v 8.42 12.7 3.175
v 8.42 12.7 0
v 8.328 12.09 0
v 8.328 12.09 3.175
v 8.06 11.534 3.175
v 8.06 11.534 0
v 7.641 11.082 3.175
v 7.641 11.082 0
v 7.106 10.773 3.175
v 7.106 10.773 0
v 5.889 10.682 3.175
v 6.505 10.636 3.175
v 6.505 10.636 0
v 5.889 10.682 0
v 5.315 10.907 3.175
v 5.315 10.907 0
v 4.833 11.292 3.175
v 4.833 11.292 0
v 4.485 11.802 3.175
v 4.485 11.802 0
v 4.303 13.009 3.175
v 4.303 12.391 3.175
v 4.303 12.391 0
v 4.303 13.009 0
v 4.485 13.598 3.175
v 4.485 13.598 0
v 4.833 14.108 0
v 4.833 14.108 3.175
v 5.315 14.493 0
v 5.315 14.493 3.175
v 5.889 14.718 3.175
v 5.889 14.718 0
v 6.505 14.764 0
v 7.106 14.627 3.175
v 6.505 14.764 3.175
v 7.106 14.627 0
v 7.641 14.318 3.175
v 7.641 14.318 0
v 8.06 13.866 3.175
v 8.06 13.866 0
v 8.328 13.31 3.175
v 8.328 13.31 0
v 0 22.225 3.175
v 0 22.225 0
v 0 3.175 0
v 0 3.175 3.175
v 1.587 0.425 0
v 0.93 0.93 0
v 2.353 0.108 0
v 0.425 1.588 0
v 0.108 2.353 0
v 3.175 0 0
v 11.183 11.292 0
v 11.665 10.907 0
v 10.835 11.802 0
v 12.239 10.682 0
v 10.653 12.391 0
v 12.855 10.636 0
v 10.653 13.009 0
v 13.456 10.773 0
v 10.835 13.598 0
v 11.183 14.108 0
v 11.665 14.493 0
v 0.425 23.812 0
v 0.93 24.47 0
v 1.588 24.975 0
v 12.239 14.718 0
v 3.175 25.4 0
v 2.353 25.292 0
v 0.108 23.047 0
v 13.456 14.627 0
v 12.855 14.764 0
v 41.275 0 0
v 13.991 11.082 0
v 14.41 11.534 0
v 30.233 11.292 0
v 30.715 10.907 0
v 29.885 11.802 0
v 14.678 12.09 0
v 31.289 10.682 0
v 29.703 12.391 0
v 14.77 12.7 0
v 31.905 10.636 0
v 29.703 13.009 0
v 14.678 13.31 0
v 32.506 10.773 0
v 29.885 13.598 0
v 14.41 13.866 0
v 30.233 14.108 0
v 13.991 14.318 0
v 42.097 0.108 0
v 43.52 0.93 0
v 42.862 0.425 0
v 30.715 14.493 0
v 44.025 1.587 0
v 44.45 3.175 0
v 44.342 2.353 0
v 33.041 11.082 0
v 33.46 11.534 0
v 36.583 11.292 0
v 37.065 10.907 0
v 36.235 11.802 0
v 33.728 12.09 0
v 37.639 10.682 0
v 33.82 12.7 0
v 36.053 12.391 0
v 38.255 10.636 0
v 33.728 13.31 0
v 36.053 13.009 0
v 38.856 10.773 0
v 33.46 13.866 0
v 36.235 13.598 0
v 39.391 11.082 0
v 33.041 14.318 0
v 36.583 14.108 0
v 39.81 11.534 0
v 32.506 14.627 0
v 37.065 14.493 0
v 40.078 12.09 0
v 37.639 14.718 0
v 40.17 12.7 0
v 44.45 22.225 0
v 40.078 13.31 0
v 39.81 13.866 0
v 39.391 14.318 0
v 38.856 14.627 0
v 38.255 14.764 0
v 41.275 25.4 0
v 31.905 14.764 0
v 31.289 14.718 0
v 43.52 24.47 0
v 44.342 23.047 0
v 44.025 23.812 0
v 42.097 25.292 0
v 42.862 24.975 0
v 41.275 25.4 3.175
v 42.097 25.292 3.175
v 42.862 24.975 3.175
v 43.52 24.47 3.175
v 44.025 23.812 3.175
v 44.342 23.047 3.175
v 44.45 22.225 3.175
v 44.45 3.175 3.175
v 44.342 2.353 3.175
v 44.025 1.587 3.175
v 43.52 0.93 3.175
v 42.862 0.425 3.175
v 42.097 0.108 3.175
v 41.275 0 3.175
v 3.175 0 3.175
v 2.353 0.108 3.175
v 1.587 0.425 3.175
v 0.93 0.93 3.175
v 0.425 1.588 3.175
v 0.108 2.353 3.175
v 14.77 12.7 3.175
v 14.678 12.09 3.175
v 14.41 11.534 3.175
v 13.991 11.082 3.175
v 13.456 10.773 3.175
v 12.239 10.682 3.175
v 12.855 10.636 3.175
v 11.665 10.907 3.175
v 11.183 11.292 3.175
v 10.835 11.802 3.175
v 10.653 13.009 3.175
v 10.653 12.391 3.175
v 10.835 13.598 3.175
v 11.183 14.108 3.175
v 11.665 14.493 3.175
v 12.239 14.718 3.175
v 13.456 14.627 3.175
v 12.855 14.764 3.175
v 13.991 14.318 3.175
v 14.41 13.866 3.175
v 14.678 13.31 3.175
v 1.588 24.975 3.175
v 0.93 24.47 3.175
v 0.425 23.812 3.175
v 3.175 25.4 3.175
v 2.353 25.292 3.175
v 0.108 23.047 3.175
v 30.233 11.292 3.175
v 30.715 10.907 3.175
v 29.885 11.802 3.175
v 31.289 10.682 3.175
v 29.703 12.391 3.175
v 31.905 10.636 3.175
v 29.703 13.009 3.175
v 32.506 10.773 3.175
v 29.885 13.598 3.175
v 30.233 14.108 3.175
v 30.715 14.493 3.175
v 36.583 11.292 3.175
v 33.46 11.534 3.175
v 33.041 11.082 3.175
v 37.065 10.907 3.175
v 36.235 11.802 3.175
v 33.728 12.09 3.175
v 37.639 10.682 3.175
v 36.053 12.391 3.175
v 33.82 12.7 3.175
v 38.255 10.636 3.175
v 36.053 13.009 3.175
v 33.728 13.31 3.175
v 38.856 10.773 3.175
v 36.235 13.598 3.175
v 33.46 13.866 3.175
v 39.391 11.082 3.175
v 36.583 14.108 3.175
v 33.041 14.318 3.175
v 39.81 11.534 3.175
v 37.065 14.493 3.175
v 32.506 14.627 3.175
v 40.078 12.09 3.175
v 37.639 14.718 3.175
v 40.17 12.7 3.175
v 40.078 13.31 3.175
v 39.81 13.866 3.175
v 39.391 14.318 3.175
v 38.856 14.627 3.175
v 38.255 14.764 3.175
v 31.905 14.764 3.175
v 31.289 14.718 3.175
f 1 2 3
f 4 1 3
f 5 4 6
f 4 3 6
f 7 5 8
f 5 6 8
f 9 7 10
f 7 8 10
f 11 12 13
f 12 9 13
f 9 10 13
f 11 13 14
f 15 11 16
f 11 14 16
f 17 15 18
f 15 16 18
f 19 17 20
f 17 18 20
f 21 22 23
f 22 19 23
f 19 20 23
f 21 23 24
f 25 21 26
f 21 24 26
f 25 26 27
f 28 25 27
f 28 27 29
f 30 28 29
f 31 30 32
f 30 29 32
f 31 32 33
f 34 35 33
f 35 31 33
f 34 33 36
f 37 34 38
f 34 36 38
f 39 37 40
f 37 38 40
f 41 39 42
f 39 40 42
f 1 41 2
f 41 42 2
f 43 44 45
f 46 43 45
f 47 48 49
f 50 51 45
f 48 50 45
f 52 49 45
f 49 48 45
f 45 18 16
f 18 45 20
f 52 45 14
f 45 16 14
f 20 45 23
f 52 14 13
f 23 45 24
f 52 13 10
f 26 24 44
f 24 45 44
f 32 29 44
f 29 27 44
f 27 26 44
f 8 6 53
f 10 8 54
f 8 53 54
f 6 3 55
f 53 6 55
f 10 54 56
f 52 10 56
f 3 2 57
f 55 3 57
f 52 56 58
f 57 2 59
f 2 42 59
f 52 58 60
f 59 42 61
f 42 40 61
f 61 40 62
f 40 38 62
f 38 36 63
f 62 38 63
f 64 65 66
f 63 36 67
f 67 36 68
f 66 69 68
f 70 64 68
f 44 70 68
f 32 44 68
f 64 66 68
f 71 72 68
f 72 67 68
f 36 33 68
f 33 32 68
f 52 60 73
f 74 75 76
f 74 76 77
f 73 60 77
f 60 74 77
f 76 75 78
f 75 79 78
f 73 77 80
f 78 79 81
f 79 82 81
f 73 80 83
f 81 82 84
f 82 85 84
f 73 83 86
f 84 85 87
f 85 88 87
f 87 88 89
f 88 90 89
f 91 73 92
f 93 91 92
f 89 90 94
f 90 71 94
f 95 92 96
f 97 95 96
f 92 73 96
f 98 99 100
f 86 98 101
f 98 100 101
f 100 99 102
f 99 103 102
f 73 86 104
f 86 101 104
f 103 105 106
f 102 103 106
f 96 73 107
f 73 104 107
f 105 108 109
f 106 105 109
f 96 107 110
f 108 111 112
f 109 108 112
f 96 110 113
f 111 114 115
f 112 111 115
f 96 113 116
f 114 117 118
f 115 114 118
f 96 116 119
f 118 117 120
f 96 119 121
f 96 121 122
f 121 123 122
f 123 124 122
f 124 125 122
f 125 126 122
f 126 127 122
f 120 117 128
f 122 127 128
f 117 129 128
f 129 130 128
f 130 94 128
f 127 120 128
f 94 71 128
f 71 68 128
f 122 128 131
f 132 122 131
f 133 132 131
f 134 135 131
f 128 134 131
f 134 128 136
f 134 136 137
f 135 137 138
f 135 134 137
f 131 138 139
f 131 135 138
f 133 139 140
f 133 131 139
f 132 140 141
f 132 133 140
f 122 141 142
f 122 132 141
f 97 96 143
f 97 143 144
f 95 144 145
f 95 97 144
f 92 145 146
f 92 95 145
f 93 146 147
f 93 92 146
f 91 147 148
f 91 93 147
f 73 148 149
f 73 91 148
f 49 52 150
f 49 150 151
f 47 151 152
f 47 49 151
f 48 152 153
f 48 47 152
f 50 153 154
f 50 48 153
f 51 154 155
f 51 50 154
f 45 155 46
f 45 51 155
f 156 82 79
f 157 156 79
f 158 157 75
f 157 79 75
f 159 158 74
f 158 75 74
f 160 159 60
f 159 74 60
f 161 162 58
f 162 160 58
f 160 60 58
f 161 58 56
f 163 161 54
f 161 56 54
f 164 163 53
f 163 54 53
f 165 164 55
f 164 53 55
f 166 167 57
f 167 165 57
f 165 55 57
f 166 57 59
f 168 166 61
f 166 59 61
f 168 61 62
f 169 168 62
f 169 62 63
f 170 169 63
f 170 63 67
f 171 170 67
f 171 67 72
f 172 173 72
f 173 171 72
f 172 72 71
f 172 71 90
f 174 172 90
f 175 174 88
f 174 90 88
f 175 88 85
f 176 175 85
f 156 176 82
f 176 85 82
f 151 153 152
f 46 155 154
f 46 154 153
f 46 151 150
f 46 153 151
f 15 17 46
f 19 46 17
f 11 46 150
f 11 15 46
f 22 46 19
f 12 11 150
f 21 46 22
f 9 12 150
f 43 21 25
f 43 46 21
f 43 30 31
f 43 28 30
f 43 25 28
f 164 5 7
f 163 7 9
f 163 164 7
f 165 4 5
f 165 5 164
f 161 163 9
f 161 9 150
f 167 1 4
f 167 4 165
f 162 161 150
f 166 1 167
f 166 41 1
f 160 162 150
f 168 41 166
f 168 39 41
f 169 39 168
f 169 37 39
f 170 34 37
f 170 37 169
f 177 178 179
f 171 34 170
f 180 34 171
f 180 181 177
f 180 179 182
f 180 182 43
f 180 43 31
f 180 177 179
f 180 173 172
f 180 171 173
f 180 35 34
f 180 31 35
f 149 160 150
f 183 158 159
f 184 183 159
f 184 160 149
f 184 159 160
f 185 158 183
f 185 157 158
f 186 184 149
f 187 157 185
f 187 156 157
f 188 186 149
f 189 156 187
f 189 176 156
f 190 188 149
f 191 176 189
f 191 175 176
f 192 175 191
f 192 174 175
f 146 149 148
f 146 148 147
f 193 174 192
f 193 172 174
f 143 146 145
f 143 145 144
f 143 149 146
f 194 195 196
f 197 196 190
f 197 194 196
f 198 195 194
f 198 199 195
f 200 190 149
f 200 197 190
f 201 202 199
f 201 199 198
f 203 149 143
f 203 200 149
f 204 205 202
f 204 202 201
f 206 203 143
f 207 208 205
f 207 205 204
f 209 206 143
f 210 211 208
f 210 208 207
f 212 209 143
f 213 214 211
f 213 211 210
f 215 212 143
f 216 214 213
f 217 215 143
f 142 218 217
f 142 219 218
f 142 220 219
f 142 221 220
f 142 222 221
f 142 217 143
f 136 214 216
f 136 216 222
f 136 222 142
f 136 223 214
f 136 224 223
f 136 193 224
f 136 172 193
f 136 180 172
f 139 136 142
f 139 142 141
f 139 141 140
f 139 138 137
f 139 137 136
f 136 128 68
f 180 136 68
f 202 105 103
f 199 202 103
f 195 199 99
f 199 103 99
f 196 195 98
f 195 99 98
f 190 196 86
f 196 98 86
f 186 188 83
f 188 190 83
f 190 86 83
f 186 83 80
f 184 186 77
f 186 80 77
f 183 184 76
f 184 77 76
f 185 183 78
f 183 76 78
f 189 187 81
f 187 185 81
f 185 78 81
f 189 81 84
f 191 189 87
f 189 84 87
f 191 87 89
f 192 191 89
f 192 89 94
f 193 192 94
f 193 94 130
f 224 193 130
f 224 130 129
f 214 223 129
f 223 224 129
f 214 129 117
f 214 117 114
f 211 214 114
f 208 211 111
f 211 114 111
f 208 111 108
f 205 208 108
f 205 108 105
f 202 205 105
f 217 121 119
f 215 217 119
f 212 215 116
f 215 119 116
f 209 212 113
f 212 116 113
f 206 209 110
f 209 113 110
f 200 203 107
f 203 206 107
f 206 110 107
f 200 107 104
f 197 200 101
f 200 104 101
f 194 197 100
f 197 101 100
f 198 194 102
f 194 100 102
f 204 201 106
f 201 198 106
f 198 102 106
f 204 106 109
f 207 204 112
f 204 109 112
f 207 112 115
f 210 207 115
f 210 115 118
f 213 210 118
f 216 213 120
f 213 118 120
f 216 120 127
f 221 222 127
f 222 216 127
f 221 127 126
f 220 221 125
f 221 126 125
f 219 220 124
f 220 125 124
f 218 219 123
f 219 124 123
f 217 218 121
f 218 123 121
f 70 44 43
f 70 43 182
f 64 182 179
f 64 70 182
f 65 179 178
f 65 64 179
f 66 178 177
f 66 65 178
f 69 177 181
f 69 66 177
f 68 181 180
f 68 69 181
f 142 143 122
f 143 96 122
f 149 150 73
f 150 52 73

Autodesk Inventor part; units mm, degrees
ref_plane "YZ Plane" through (0, 0, 0) normal (1, 0, 0) x (0, 1, 0)
ref_plane "XZ Plane" through (0, 0, 0) normal (0, 1, 0) x (-1, 0, 0)
ref_plane "XY Plane" through (0, 0, 0) normal (0, 0, 1) x (1, 0, 0)
sketch "Sketch1" plane through (0, 0, 0) normal (0, 0, 1) x (1, 0, 0)
  line L0 (3.175, 0) -> (41.275, 0)
  line L1 (44.45, 3.175) -> (44.45, 22.225)
  line L2 (41.275, 25.4) -> (3.175, 25.4)
  line L3 (0, 22.225) -> (0, 3.175)
  circle A0 centre (6.35, 12.7) radius 2.0701
  circle A1 centre (31.75, 12.7) radius 2.0701
  circle A2 centre (12.7, 12.7) radius 2.0701
  line L4 (0, 12.7) -> (44.45, 12.7) construction
  circle A3 centre (38.1, 12.7) radius 2.0701
  arc A4 (3.175, 25.4) -> (0, 22.225) centre (3.175, 22.225) ccw
  arc A5 (44.45, 22.225) -> (41.275, 25.4) centre (41.275, 22.225) ccw
  arc A6 (41.275, 0) -> (44.45, 3.175) centre (41.275, 3.175) ccw
  arc A7 (0, 3.175) -> (3.175, 0) centre (3.175, 3.175) ccw
  point P0 (0, 0)
  point P1 (44.45, 25.4)
  point P2 (44.45, 0)
  point P3 (0, 25.4)
  dimension "d0" = 44.45
  dimension "d1" = 25.4
  dimension "d2" = 4.1402
  dimension "d3" = 6.35
  dimension "d7" = 25.4
  dimension "d12" = 6.35
  dimension "d15" = 25.4
  dimension "d20" = 3.175
extrude "Extrusion1" add sketch "Sketch1" along normal blind 3.175
properties part number "Bearing Mount Spacer 1-8 in" material "Aluminum 6061"
